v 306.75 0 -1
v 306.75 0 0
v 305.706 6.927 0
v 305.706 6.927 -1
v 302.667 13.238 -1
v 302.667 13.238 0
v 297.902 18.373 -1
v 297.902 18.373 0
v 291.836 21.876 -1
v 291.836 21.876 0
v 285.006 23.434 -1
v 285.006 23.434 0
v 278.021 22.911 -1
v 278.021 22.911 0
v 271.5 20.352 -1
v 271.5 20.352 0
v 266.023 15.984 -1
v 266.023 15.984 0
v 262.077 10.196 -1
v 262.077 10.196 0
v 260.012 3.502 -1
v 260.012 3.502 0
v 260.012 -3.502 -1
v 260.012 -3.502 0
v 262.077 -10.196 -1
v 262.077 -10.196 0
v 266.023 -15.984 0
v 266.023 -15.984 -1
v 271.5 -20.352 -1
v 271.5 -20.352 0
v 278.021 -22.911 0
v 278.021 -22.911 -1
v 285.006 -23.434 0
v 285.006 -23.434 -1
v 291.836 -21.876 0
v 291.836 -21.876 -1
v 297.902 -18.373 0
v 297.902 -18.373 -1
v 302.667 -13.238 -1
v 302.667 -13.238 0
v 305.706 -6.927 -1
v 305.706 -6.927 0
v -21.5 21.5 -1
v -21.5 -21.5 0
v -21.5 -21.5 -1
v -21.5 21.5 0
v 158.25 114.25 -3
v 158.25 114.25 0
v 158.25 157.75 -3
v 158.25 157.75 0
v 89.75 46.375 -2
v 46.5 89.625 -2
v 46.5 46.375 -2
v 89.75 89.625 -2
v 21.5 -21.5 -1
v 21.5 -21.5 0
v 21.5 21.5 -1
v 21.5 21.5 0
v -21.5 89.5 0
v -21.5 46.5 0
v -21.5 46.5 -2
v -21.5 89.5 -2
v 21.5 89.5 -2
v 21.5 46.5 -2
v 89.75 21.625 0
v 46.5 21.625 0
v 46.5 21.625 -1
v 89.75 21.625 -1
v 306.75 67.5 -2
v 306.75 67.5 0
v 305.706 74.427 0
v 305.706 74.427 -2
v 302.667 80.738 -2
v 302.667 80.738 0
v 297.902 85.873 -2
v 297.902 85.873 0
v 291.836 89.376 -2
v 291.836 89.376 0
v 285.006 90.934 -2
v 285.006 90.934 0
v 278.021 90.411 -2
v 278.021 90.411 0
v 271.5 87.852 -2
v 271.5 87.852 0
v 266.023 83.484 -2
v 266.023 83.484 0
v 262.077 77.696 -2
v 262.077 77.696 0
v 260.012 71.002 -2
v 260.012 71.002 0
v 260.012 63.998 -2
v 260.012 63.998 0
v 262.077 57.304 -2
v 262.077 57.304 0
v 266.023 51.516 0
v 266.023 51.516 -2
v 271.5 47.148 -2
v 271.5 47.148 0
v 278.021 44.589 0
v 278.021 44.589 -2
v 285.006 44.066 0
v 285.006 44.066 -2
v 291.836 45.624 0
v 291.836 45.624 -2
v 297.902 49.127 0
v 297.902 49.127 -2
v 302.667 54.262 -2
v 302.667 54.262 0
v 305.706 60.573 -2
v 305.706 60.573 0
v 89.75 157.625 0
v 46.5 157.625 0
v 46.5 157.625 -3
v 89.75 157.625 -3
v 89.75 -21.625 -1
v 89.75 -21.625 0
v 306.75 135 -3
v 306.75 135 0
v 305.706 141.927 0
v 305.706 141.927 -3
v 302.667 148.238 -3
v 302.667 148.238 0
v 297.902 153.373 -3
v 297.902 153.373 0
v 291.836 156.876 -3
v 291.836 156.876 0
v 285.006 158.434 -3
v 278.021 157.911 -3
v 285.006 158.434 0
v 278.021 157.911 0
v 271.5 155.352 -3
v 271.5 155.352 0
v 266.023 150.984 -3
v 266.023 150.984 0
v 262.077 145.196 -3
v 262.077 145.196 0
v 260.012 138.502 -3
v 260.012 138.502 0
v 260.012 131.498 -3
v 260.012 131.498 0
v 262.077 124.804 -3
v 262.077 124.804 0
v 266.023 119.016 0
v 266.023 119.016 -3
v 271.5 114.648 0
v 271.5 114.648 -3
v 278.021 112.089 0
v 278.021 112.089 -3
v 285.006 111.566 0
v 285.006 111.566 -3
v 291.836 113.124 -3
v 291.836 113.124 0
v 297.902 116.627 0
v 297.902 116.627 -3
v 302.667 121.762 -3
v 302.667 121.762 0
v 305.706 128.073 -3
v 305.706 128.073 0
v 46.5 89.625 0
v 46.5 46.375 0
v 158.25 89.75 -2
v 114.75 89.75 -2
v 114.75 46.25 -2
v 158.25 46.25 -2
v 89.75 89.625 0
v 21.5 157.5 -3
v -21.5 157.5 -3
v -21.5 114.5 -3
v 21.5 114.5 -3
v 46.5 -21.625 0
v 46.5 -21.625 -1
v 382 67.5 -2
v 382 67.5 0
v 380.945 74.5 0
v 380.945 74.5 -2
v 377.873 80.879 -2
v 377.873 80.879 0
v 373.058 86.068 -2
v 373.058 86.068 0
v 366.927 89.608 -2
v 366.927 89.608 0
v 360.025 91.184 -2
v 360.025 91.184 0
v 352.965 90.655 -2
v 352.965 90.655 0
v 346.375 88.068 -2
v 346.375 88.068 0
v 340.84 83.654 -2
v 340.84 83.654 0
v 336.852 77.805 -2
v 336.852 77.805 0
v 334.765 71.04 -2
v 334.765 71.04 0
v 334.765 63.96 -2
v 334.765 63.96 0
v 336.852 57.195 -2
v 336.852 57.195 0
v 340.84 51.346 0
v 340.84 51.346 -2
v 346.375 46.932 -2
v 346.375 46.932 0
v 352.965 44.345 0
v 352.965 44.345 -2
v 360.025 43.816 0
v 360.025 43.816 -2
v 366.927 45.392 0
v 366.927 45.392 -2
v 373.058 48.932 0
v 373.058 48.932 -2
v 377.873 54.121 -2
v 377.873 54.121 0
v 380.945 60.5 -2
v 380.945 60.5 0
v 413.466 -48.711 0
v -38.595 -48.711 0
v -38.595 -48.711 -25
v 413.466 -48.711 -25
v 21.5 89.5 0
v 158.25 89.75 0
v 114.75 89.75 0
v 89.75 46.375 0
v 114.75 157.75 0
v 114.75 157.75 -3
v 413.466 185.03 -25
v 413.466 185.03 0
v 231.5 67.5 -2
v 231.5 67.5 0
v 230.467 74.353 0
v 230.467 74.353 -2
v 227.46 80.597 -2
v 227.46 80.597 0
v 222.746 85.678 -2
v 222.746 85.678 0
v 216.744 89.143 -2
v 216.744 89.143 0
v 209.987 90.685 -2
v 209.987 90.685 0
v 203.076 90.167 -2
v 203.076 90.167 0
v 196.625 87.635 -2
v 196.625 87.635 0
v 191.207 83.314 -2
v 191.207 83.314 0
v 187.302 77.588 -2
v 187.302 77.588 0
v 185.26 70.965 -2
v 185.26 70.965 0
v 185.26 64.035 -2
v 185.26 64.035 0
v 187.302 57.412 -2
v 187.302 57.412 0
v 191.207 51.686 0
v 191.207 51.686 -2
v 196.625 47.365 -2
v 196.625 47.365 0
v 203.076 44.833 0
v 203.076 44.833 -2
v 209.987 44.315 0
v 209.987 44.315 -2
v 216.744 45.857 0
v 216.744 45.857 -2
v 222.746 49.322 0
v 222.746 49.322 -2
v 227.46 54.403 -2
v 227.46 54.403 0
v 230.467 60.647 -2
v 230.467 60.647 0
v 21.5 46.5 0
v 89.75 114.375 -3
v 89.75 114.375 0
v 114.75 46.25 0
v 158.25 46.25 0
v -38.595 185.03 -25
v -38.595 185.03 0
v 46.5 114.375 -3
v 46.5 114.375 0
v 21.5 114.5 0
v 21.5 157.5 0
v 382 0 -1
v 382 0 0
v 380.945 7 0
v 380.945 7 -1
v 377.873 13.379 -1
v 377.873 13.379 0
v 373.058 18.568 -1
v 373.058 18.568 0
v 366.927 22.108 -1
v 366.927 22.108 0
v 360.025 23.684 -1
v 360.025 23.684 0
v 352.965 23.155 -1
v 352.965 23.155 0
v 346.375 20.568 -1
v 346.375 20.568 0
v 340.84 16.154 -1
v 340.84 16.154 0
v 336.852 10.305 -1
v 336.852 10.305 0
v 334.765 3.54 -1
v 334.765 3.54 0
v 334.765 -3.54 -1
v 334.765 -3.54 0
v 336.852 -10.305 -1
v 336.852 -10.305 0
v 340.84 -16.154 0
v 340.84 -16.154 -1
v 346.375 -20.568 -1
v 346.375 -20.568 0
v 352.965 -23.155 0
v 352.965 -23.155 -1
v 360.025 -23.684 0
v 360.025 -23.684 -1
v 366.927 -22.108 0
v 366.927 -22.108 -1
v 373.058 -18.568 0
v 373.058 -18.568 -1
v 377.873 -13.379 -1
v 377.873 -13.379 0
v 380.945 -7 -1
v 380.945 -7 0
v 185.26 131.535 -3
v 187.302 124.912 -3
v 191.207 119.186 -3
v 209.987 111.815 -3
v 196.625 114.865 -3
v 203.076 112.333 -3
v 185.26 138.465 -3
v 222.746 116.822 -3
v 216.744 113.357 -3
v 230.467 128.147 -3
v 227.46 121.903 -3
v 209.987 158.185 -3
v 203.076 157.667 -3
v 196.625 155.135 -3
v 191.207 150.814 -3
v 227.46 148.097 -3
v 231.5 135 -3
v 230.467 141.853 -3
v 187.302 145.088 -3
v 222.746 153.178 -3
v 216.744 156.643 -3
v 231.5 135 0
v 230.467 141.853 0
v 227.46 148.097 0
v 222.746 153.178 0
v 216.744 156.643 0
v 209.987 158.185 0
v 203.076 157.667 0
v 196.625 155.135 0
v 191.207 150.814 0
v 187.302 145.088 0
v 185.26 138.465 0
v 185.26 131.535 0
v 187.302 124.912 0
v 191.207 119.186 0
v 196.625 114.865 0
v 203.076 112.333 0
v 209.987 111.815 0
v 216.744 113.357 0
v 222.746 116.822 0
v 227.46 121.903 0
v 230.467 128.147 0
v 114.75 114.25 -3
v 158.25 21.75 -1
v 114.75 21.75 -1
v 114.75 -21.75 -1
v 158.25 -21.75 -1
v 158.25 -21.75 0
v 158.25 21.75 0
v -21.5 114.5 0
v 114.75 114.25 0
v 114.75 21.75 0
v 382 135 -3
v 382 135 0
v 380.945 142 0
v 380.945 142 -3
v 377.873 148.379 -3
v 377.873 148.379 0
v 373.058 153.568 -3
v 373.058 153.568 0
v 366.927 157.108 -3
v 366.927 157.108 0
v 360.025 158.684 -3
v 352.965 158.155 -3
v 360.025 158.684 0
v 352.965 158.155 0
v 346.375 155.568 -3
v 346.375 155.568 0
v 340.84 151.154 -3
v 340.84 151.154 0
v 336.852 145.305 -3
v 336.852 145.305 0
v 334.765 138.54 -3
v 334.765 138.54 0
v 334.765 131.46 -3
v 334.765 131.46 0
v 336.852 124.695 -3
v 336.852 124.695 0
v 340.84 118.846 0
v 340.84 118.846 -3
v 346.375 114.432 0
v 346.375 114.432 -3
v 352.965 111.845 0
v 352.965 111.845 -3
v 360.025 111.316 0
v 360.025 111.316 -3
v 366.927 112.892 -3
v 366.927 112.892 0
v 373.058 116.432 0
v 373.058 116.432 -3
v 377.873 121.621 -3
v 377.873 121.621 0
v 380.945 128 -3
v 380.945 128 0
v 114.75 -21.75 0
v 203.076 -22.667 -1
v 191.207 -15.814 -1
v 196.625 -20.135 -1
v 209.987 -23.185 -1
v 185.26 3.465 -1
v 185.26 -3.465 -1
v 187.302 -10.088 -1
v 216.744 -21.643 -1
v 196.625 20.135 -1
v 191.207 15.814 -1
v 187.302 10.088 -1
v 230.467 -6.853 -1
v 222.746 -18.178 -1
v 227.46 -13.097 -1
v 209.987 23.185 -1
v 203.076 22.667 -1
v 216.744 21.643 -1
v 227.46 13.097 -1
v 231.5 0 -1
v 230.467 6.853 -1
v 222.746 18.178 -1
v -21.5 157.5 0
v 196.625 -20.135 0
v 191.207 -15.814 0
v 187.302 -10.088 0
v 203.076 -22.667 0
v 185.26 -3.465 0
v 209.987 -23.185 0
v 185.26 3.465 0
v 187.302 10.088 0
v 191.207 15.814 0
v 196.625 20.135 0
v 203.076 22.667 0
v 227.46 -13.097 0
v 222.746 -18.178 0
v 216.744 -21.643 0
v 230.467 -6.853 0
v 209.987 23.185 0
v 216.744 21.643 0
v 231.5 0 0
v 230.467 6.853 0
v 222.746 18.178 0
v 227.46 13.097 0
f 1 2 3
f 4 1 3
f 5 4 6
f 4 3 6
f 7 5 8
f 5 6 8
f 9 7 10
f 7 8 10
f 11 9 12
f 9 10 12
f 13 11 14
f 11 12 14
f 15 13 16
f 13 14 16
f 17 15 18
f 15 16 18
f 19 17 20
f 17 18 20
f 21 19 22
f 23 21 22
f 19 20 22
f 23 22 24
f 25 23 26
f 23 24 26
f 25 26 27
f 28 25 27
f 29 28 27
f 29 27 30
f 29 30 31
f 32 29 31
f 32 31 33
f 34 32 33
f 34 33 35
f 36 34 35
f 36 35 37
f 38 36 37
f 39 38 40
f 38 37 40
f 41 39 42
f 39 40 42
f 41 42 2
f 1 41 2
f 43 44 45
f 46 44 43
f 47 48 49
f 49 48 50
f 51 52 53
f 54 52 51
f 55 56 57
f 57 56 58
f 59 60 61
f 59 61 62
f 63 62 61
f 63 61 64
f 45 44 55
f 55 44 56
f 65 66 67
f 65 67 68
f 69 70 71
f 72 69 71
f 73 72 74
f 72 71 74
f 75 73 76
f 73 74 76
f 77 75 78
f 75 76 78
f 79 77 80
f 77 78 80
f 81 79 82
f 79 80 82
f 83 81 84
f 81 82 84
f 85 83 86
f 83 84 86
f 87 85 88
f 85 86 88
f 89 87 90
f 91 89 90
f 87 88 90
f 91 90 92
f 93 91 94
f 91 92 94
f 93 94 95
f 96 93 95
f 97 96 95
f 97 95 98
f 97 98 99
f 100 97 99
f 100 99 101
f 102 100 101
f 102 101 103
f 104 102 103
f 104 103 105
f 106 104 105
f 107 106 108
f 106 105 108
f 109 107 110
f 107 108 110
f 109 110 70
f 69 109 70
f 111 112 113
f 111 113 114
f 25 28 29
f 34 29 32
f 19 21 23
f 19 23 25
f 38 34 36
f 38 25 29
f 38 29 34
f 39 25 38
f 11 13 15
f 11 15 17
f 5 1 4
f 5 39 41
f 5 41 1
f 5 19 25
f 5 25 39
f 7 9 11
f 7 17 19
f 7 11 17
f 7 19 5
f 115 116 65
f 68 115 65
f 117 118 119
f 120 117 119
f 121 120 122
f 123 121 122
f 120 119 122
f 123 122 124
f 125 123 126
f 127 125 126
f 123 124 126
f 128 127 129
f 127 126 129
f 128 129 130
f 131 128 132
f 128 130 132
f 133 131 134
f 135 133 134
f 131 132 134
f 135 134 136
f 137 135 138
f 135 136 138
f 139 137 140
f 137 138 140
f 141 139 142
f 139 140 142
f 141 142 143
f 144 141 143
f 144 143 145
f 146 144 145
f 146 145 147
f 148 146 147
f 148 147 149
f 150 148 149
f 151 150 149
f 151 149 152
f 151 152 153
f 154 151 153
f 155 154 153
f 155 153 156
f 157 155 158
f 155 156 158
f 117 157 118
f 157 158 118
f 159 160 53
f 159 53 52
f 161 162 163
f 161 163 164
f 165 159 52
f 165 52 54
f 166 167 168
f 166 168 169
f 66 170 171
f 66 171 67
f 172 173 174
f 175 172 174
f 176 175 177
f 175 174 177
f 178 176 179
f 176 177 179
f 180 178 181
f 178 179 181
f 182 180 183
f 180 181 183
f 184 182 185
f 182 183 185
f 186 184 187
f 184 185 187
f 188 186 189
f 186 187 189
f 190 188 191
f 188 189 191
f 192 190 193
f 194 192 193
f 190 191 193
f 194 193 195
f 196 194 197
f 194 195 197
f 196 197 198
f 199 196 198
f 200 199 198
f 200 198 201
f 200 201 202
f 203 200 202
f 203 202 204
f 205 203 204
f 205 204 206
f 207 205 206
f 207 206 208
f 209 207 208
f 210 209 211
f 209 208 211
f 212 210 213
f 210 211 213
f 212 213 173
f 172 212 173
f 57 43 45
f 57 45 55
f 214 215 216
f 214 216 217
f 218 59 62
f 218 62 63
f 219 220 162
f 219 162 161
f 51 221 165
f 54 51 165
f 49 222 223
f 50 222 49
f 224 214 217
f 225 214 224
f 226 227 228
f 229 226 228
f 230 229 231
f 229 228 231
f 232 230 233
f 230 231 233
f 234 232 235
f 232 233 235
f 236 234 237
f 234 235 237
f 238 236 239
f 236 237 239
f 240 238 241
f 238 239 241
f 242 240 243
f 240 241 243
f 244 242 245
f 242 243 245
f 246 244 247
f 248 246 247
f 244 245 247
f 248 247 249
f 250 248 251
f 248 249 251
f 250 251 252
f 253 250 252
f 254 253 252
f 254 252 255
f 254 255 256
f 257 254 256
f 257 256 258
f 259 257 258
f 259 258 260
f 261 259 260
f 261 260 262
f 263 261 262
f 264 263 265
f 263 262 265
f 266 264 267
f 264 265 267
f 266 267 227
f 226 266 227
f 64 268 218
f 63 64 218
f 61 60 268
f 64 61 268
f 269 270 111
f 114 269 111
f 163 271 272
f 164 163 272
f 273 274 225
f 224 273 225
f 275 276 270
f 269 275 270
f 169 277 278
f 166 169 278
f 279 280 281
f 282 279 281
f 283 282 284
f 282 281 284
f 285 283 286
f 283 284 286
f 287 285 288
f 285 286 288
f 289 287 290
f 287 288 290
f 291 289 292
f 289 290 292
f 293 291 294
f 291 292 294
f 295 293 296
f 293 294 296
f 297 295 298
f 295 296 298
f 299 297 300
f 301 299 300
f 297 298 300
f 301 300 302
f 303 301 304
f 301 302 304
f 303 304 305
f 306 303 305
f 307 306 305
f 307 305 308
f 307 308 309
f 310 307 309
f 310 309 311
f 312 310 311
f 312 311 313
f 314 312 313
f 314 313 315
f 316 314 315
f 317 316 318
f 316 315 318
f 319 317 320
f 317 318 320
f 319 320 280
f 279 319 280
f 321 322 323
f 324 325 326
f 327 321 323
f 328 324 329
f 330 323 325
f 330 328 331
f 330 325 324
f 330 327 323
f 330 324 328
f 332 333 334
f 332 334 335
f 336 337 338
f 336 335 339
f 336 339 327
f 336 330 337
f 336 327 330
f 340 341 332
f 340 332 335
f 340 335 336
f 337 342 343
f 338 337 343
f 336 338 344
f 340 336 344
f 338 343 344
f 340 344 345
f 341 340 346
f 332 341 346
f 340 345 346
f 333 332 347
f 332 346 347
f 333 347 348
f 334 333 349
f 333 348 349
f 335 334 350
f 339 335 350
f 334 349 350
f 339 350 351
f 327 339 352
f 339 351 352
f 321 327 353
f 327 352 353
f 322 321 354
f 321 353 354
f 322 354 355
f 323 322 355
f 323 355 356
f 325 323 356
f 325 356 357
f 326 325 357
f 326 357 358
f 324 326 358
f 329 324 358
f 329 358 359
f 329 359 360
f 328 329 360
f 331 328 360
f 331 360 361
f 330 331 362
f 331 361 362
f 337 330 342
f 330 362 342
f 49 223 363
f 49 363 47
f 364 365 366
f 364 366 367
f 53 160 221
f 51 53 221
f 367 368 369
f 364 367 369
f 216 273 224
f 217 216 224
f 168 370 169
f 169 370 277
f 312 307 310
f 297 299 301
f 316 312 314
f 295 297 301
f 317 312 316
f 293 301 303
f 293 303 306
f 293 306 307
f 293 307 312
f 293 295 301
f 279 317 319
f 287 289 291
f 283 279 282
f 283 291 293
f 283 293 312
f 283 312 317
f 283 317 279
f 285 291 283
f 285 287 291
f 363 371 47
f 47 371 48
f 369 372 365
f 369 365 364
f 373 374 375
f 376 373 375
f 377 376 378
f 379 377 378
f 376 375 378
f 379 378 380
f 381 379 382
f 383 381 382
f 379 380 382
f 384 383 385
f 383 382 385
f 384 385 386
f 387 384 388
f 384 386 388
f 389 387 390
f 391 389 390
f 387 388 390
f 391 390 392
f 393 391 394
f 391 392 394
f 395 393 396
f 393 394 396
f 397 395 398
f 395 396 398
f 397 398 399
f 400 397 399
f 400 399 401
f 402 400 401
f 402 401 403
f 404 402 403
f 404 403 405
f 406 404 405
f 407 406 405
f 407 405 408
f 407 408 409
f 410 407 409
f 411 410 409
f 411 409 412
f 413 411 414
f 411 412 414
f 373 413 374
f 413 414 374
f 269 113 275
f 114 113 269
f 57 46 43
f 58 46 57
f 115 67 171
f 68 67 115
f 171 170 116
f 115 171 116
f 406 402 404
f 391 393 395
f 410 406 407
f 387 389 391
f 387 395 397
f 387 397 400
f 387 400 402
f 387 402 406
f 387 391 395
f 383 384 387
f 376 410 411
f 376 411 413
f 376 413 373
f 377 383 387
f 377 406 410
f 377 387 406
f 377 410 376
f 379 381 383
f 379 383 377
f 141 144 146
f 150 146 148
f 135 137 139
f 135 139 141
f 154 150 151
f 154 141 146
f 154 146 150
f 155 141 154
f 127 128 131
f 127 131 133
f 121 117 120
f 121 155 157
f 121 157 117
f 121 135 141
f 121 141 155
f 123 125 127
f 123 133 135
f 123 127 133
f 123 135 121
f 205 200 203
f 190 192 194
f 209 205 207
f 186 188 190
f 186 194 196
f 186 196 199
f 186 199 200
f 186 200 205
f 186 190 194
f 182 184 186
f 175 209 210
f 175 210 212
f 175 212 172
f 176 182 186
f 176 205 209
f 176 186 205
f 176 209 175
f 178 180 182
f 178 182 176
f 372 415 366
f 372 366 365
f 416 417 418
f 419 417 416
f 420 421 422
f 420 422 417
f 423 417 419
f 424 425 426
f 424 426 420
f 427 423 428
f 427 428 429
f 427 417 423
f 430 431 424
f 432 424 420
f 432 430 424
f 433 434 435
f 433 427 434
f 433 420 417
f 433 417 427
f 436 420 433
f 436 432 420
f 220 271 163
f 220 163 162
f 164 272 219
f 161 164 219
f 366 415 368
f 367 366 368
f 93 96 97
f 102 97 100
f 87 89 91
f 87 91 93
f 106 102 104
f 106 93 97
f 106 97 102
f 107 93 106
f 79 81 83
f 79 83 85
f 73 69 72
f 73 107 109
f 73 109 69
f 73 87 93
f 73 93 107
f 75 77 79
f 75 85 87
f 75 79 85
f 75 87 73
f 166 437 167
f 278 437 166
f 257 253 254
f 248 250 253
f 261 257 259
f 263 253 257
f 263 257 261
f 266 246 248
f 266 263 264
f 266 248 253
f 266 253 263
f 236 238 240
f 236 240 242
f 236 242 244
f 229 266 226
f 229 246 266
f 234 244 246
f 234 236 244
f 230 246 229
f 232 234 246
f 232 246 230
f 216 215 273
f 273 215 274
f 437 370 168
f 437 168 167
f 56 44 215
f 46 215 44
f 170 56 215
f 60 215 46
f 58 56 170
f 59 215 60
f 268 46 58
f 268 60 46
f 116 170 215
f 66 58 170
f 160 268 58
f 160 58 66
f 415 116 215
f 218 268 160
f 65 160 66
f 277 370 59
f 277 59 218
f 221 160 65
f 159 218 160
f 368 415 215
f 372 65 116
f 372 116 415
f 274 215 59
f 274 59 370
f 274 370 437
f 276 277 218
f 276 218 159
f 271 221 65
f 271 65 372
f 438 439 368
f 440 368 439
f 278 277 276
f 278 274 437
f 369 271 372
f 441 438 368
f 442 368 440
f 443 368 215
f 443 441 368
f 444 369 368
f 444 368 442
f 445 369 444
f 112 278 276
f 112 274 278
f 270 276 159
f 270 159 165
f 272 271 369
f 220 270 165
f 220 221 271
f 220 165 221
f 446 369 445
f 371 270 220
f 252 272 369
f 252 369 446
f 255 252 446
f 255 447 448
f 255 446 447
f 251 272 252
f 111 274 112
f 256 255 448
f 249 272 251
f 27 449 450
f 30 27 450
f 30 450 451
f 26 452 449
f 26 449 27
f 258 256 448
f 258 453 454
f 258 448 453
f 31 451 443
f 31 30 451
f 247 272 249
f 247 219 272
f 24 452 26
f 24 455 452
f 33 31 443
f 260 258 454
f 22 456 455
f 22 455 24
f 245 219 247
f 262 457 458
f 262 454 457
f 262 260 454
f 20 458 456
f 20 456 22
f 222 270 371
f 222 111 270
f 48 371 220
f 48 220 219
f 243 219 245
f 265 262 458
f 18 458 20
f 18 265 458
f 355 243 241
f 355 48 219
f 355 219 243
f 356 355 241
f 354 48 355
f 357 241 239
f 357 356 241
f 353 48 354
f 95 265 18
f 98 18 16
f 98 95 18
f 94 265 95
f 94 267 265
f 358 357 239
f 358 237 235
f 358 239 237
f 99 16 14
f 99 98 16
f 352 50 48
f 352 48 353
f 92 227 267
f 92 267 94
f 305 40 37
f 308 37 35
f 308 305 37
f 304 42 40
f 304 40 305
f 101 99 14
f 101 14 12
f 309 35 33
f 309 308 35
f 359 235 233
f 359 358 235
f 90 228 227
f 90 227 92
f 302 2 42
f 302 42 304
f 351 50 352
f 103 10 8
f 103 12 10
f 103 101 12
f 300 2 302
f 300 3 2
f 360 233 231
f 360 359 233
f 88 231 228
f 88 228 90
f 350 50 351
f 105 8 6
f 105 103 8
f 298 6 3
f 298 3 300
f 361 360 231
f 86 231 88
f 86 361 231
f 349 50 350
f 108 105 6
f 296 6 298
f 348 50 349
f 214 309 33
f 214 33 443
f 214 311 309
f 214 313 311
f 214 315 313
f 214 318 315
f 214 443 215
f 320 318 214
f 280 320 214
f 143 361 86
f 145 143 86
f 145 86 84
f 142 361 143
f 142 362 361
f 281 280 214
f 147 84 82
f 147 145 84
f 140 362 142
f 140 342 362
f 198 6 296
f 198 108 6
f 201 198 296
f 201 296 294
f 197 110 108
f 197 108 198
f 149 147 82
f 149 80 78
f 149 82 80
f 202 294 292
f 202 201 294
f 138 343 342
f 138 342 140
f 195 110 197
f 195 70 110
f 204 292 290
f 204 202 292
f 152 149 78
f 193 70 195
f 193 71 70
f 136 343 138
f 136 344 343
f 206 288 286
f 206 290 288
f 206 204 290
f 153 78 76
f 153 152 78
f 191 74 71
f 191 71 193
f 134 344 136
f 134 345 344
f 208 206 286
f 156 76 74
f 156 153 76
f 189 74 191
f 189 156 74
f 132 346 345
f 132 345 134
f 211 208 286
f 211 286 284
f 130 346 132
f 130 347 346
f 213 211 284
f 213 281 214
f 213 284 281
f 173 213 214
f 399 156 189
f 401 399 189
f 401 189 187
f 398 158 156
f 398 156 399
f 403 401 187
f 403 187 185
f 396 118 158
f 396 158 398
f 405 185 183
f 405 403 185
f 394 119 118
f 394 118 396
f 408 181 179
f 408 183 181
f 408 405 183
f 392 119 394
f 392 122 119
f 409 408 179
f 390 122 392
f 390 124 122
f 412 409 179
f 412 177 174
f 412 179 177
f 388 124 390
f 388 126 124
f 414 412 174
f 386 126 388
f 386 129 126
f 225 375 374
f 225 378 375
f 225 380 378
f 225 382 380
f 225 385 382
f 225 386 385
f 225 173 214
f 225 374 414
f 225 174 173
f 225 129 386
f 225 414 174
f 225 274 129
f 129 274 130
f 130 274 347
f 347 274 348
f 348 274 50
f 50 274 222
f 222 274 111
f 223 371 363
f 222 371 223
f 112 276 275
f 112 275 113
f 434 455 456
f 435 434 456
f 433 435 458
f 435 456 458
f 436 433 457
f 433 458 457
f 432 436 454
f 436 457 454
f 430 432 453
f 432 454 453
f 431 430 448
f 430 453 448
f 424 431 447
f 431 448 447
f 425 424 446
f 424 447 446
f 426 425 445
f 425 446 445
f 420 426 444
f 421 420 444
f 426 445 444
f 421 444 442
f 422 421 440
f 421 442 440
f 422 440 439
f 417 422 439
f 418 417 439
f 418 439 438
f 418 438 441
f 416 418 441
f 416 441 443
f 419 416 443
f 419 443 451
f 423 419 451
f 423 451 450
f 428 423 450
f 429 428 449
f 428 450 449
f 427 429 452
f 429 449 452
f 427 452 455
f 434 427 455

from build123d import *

# Parameters (mm, degrees)
F3_W      = 452.06105
F3_H      = 233.740471
F4_DEPTH  = 25
F0_W      = 43
F0_H      = 43
F0_W_2    = 43.25
F0_H_2    = 43.25
F0_W_3    = 43.5
F0_H_3    = 43.5
F5_DEPTH  = 1
F1_W      = 43
F1_H      = 43
F1_W_2    = 43.25
F1_H_2    = 43.25
F1_W_3    = 43.5
F1_H_3    = 43.5
F6_DEPTH  = 2
F2_W      = 43
F2_H      = 43
F2_W_2    = 43.25
F2_H_2    = 43.25
F2_W_3    = 43.5
F2_H_3    = 43.5
F7_DEPTH  = 3
F8_R      = 23.25
F8_R_2    = 23.5
F8_R_3    = 23.75
F11_DEPTH = 1
F9_R      = 23.25
F9_R_2    = 23.5
F9_R_3    = 23.75
F12_DEPTH = 2
F10_R     = 23.25
F10_R_2   = 23.5
F10_R_3   = 23.75
F13_DEPTH = 3


with BuildPart() as f4:
    # F3 (on Top) → F4 (new body)
    with BuildSketch(Plane.XY):
        with Locations((187.43575, 68.15933)):
            Rectangle(F3_W, F3_H)
    extrude(amount=-F4_DEPTH)

    # F0 (on Top) → F5 (cut)
    with BuildSketch(Plane.XY):
        Rectangle(F0_W, F0_H)
        with Locations((68.125, 0)):
            Rectangle(F0_W_2, F0_H_2)
        with Locations((136.5, 0)):
            Rectangle(F0_W_3, F0_H_3)
    extrude(amount=-F5_DEPTH, mode=Mode.SUBTRACT)

    # F1 (on Top) → F6 (cut)
    with BuildSketch(Plane.XY):
        with Locations((0, 68)):
            Rectangle(F1_W, F1_H)
        with Locations((68.125, 68)):
            Rectangle(F1_W_2, F1_H_2)
        with Locations((136.5, 68)):
            Rectangle(F1_W_3, F1_H_3)
    extrude(amount=-F6_DEPTH, mode=Mode.SUBTRACT)

    # F2 (on Top) → F7 (cut)
    with BuildSketch(Plane.XY):
        with Locations((0, 136)):
            Rectangle(F2_W, F2_H)
        with Locations((68.125, 136)):
            Rectangle(F2_W_2, F2_H_2)
        with Locations((136.5, 136)):
            Rectangle(F2_W_3, F2_H_3)
    extrude(amount=-F7_DEPTH, mode=Mode.SUBTRACT)

    # F8 (on face) → F11 (cut)
    with BuildSketch(Plane.XY):
        with Locations((208.25, 0)):
            Circle(F8_R)
        with Locations((283.25, 0)):
            Circle(F8_R_2)
        with Locations((358.25, 0)):
            Circle(F8_R_3)
    extrude(amount=-F11_DEPTH, mode=Mode.SUBTRACT)

    # F9 (on face) → F12 (cut)
    with BuildSketch(Plane.XY):
        with Locations((208.25, 67.5)):
            Circle(F9_R)
        with Locations((283.25, 67.5)):
            Circle(F9_R_2)
        with Locations((358.25, 67.5)):
            Circle(F9_R_3)
    extrude(amount=-F12_DEPTH, mode=Mode.SUBTRACT)

    # F10 (on face) → F13 (cut)
    with BuildSketch(Plane.XY):
        with Locations((208.25, 135)):
            Circle(F10_R)
        with Locations((283.25, 135)):
            Circle(F10_R_2)
        with Locations((358.25, 135)):
            Circle(F10_R_3)
    extrude(amount=-F13_DEPTH, mode=Mode.SUBTRACT)


solid = f4.part
